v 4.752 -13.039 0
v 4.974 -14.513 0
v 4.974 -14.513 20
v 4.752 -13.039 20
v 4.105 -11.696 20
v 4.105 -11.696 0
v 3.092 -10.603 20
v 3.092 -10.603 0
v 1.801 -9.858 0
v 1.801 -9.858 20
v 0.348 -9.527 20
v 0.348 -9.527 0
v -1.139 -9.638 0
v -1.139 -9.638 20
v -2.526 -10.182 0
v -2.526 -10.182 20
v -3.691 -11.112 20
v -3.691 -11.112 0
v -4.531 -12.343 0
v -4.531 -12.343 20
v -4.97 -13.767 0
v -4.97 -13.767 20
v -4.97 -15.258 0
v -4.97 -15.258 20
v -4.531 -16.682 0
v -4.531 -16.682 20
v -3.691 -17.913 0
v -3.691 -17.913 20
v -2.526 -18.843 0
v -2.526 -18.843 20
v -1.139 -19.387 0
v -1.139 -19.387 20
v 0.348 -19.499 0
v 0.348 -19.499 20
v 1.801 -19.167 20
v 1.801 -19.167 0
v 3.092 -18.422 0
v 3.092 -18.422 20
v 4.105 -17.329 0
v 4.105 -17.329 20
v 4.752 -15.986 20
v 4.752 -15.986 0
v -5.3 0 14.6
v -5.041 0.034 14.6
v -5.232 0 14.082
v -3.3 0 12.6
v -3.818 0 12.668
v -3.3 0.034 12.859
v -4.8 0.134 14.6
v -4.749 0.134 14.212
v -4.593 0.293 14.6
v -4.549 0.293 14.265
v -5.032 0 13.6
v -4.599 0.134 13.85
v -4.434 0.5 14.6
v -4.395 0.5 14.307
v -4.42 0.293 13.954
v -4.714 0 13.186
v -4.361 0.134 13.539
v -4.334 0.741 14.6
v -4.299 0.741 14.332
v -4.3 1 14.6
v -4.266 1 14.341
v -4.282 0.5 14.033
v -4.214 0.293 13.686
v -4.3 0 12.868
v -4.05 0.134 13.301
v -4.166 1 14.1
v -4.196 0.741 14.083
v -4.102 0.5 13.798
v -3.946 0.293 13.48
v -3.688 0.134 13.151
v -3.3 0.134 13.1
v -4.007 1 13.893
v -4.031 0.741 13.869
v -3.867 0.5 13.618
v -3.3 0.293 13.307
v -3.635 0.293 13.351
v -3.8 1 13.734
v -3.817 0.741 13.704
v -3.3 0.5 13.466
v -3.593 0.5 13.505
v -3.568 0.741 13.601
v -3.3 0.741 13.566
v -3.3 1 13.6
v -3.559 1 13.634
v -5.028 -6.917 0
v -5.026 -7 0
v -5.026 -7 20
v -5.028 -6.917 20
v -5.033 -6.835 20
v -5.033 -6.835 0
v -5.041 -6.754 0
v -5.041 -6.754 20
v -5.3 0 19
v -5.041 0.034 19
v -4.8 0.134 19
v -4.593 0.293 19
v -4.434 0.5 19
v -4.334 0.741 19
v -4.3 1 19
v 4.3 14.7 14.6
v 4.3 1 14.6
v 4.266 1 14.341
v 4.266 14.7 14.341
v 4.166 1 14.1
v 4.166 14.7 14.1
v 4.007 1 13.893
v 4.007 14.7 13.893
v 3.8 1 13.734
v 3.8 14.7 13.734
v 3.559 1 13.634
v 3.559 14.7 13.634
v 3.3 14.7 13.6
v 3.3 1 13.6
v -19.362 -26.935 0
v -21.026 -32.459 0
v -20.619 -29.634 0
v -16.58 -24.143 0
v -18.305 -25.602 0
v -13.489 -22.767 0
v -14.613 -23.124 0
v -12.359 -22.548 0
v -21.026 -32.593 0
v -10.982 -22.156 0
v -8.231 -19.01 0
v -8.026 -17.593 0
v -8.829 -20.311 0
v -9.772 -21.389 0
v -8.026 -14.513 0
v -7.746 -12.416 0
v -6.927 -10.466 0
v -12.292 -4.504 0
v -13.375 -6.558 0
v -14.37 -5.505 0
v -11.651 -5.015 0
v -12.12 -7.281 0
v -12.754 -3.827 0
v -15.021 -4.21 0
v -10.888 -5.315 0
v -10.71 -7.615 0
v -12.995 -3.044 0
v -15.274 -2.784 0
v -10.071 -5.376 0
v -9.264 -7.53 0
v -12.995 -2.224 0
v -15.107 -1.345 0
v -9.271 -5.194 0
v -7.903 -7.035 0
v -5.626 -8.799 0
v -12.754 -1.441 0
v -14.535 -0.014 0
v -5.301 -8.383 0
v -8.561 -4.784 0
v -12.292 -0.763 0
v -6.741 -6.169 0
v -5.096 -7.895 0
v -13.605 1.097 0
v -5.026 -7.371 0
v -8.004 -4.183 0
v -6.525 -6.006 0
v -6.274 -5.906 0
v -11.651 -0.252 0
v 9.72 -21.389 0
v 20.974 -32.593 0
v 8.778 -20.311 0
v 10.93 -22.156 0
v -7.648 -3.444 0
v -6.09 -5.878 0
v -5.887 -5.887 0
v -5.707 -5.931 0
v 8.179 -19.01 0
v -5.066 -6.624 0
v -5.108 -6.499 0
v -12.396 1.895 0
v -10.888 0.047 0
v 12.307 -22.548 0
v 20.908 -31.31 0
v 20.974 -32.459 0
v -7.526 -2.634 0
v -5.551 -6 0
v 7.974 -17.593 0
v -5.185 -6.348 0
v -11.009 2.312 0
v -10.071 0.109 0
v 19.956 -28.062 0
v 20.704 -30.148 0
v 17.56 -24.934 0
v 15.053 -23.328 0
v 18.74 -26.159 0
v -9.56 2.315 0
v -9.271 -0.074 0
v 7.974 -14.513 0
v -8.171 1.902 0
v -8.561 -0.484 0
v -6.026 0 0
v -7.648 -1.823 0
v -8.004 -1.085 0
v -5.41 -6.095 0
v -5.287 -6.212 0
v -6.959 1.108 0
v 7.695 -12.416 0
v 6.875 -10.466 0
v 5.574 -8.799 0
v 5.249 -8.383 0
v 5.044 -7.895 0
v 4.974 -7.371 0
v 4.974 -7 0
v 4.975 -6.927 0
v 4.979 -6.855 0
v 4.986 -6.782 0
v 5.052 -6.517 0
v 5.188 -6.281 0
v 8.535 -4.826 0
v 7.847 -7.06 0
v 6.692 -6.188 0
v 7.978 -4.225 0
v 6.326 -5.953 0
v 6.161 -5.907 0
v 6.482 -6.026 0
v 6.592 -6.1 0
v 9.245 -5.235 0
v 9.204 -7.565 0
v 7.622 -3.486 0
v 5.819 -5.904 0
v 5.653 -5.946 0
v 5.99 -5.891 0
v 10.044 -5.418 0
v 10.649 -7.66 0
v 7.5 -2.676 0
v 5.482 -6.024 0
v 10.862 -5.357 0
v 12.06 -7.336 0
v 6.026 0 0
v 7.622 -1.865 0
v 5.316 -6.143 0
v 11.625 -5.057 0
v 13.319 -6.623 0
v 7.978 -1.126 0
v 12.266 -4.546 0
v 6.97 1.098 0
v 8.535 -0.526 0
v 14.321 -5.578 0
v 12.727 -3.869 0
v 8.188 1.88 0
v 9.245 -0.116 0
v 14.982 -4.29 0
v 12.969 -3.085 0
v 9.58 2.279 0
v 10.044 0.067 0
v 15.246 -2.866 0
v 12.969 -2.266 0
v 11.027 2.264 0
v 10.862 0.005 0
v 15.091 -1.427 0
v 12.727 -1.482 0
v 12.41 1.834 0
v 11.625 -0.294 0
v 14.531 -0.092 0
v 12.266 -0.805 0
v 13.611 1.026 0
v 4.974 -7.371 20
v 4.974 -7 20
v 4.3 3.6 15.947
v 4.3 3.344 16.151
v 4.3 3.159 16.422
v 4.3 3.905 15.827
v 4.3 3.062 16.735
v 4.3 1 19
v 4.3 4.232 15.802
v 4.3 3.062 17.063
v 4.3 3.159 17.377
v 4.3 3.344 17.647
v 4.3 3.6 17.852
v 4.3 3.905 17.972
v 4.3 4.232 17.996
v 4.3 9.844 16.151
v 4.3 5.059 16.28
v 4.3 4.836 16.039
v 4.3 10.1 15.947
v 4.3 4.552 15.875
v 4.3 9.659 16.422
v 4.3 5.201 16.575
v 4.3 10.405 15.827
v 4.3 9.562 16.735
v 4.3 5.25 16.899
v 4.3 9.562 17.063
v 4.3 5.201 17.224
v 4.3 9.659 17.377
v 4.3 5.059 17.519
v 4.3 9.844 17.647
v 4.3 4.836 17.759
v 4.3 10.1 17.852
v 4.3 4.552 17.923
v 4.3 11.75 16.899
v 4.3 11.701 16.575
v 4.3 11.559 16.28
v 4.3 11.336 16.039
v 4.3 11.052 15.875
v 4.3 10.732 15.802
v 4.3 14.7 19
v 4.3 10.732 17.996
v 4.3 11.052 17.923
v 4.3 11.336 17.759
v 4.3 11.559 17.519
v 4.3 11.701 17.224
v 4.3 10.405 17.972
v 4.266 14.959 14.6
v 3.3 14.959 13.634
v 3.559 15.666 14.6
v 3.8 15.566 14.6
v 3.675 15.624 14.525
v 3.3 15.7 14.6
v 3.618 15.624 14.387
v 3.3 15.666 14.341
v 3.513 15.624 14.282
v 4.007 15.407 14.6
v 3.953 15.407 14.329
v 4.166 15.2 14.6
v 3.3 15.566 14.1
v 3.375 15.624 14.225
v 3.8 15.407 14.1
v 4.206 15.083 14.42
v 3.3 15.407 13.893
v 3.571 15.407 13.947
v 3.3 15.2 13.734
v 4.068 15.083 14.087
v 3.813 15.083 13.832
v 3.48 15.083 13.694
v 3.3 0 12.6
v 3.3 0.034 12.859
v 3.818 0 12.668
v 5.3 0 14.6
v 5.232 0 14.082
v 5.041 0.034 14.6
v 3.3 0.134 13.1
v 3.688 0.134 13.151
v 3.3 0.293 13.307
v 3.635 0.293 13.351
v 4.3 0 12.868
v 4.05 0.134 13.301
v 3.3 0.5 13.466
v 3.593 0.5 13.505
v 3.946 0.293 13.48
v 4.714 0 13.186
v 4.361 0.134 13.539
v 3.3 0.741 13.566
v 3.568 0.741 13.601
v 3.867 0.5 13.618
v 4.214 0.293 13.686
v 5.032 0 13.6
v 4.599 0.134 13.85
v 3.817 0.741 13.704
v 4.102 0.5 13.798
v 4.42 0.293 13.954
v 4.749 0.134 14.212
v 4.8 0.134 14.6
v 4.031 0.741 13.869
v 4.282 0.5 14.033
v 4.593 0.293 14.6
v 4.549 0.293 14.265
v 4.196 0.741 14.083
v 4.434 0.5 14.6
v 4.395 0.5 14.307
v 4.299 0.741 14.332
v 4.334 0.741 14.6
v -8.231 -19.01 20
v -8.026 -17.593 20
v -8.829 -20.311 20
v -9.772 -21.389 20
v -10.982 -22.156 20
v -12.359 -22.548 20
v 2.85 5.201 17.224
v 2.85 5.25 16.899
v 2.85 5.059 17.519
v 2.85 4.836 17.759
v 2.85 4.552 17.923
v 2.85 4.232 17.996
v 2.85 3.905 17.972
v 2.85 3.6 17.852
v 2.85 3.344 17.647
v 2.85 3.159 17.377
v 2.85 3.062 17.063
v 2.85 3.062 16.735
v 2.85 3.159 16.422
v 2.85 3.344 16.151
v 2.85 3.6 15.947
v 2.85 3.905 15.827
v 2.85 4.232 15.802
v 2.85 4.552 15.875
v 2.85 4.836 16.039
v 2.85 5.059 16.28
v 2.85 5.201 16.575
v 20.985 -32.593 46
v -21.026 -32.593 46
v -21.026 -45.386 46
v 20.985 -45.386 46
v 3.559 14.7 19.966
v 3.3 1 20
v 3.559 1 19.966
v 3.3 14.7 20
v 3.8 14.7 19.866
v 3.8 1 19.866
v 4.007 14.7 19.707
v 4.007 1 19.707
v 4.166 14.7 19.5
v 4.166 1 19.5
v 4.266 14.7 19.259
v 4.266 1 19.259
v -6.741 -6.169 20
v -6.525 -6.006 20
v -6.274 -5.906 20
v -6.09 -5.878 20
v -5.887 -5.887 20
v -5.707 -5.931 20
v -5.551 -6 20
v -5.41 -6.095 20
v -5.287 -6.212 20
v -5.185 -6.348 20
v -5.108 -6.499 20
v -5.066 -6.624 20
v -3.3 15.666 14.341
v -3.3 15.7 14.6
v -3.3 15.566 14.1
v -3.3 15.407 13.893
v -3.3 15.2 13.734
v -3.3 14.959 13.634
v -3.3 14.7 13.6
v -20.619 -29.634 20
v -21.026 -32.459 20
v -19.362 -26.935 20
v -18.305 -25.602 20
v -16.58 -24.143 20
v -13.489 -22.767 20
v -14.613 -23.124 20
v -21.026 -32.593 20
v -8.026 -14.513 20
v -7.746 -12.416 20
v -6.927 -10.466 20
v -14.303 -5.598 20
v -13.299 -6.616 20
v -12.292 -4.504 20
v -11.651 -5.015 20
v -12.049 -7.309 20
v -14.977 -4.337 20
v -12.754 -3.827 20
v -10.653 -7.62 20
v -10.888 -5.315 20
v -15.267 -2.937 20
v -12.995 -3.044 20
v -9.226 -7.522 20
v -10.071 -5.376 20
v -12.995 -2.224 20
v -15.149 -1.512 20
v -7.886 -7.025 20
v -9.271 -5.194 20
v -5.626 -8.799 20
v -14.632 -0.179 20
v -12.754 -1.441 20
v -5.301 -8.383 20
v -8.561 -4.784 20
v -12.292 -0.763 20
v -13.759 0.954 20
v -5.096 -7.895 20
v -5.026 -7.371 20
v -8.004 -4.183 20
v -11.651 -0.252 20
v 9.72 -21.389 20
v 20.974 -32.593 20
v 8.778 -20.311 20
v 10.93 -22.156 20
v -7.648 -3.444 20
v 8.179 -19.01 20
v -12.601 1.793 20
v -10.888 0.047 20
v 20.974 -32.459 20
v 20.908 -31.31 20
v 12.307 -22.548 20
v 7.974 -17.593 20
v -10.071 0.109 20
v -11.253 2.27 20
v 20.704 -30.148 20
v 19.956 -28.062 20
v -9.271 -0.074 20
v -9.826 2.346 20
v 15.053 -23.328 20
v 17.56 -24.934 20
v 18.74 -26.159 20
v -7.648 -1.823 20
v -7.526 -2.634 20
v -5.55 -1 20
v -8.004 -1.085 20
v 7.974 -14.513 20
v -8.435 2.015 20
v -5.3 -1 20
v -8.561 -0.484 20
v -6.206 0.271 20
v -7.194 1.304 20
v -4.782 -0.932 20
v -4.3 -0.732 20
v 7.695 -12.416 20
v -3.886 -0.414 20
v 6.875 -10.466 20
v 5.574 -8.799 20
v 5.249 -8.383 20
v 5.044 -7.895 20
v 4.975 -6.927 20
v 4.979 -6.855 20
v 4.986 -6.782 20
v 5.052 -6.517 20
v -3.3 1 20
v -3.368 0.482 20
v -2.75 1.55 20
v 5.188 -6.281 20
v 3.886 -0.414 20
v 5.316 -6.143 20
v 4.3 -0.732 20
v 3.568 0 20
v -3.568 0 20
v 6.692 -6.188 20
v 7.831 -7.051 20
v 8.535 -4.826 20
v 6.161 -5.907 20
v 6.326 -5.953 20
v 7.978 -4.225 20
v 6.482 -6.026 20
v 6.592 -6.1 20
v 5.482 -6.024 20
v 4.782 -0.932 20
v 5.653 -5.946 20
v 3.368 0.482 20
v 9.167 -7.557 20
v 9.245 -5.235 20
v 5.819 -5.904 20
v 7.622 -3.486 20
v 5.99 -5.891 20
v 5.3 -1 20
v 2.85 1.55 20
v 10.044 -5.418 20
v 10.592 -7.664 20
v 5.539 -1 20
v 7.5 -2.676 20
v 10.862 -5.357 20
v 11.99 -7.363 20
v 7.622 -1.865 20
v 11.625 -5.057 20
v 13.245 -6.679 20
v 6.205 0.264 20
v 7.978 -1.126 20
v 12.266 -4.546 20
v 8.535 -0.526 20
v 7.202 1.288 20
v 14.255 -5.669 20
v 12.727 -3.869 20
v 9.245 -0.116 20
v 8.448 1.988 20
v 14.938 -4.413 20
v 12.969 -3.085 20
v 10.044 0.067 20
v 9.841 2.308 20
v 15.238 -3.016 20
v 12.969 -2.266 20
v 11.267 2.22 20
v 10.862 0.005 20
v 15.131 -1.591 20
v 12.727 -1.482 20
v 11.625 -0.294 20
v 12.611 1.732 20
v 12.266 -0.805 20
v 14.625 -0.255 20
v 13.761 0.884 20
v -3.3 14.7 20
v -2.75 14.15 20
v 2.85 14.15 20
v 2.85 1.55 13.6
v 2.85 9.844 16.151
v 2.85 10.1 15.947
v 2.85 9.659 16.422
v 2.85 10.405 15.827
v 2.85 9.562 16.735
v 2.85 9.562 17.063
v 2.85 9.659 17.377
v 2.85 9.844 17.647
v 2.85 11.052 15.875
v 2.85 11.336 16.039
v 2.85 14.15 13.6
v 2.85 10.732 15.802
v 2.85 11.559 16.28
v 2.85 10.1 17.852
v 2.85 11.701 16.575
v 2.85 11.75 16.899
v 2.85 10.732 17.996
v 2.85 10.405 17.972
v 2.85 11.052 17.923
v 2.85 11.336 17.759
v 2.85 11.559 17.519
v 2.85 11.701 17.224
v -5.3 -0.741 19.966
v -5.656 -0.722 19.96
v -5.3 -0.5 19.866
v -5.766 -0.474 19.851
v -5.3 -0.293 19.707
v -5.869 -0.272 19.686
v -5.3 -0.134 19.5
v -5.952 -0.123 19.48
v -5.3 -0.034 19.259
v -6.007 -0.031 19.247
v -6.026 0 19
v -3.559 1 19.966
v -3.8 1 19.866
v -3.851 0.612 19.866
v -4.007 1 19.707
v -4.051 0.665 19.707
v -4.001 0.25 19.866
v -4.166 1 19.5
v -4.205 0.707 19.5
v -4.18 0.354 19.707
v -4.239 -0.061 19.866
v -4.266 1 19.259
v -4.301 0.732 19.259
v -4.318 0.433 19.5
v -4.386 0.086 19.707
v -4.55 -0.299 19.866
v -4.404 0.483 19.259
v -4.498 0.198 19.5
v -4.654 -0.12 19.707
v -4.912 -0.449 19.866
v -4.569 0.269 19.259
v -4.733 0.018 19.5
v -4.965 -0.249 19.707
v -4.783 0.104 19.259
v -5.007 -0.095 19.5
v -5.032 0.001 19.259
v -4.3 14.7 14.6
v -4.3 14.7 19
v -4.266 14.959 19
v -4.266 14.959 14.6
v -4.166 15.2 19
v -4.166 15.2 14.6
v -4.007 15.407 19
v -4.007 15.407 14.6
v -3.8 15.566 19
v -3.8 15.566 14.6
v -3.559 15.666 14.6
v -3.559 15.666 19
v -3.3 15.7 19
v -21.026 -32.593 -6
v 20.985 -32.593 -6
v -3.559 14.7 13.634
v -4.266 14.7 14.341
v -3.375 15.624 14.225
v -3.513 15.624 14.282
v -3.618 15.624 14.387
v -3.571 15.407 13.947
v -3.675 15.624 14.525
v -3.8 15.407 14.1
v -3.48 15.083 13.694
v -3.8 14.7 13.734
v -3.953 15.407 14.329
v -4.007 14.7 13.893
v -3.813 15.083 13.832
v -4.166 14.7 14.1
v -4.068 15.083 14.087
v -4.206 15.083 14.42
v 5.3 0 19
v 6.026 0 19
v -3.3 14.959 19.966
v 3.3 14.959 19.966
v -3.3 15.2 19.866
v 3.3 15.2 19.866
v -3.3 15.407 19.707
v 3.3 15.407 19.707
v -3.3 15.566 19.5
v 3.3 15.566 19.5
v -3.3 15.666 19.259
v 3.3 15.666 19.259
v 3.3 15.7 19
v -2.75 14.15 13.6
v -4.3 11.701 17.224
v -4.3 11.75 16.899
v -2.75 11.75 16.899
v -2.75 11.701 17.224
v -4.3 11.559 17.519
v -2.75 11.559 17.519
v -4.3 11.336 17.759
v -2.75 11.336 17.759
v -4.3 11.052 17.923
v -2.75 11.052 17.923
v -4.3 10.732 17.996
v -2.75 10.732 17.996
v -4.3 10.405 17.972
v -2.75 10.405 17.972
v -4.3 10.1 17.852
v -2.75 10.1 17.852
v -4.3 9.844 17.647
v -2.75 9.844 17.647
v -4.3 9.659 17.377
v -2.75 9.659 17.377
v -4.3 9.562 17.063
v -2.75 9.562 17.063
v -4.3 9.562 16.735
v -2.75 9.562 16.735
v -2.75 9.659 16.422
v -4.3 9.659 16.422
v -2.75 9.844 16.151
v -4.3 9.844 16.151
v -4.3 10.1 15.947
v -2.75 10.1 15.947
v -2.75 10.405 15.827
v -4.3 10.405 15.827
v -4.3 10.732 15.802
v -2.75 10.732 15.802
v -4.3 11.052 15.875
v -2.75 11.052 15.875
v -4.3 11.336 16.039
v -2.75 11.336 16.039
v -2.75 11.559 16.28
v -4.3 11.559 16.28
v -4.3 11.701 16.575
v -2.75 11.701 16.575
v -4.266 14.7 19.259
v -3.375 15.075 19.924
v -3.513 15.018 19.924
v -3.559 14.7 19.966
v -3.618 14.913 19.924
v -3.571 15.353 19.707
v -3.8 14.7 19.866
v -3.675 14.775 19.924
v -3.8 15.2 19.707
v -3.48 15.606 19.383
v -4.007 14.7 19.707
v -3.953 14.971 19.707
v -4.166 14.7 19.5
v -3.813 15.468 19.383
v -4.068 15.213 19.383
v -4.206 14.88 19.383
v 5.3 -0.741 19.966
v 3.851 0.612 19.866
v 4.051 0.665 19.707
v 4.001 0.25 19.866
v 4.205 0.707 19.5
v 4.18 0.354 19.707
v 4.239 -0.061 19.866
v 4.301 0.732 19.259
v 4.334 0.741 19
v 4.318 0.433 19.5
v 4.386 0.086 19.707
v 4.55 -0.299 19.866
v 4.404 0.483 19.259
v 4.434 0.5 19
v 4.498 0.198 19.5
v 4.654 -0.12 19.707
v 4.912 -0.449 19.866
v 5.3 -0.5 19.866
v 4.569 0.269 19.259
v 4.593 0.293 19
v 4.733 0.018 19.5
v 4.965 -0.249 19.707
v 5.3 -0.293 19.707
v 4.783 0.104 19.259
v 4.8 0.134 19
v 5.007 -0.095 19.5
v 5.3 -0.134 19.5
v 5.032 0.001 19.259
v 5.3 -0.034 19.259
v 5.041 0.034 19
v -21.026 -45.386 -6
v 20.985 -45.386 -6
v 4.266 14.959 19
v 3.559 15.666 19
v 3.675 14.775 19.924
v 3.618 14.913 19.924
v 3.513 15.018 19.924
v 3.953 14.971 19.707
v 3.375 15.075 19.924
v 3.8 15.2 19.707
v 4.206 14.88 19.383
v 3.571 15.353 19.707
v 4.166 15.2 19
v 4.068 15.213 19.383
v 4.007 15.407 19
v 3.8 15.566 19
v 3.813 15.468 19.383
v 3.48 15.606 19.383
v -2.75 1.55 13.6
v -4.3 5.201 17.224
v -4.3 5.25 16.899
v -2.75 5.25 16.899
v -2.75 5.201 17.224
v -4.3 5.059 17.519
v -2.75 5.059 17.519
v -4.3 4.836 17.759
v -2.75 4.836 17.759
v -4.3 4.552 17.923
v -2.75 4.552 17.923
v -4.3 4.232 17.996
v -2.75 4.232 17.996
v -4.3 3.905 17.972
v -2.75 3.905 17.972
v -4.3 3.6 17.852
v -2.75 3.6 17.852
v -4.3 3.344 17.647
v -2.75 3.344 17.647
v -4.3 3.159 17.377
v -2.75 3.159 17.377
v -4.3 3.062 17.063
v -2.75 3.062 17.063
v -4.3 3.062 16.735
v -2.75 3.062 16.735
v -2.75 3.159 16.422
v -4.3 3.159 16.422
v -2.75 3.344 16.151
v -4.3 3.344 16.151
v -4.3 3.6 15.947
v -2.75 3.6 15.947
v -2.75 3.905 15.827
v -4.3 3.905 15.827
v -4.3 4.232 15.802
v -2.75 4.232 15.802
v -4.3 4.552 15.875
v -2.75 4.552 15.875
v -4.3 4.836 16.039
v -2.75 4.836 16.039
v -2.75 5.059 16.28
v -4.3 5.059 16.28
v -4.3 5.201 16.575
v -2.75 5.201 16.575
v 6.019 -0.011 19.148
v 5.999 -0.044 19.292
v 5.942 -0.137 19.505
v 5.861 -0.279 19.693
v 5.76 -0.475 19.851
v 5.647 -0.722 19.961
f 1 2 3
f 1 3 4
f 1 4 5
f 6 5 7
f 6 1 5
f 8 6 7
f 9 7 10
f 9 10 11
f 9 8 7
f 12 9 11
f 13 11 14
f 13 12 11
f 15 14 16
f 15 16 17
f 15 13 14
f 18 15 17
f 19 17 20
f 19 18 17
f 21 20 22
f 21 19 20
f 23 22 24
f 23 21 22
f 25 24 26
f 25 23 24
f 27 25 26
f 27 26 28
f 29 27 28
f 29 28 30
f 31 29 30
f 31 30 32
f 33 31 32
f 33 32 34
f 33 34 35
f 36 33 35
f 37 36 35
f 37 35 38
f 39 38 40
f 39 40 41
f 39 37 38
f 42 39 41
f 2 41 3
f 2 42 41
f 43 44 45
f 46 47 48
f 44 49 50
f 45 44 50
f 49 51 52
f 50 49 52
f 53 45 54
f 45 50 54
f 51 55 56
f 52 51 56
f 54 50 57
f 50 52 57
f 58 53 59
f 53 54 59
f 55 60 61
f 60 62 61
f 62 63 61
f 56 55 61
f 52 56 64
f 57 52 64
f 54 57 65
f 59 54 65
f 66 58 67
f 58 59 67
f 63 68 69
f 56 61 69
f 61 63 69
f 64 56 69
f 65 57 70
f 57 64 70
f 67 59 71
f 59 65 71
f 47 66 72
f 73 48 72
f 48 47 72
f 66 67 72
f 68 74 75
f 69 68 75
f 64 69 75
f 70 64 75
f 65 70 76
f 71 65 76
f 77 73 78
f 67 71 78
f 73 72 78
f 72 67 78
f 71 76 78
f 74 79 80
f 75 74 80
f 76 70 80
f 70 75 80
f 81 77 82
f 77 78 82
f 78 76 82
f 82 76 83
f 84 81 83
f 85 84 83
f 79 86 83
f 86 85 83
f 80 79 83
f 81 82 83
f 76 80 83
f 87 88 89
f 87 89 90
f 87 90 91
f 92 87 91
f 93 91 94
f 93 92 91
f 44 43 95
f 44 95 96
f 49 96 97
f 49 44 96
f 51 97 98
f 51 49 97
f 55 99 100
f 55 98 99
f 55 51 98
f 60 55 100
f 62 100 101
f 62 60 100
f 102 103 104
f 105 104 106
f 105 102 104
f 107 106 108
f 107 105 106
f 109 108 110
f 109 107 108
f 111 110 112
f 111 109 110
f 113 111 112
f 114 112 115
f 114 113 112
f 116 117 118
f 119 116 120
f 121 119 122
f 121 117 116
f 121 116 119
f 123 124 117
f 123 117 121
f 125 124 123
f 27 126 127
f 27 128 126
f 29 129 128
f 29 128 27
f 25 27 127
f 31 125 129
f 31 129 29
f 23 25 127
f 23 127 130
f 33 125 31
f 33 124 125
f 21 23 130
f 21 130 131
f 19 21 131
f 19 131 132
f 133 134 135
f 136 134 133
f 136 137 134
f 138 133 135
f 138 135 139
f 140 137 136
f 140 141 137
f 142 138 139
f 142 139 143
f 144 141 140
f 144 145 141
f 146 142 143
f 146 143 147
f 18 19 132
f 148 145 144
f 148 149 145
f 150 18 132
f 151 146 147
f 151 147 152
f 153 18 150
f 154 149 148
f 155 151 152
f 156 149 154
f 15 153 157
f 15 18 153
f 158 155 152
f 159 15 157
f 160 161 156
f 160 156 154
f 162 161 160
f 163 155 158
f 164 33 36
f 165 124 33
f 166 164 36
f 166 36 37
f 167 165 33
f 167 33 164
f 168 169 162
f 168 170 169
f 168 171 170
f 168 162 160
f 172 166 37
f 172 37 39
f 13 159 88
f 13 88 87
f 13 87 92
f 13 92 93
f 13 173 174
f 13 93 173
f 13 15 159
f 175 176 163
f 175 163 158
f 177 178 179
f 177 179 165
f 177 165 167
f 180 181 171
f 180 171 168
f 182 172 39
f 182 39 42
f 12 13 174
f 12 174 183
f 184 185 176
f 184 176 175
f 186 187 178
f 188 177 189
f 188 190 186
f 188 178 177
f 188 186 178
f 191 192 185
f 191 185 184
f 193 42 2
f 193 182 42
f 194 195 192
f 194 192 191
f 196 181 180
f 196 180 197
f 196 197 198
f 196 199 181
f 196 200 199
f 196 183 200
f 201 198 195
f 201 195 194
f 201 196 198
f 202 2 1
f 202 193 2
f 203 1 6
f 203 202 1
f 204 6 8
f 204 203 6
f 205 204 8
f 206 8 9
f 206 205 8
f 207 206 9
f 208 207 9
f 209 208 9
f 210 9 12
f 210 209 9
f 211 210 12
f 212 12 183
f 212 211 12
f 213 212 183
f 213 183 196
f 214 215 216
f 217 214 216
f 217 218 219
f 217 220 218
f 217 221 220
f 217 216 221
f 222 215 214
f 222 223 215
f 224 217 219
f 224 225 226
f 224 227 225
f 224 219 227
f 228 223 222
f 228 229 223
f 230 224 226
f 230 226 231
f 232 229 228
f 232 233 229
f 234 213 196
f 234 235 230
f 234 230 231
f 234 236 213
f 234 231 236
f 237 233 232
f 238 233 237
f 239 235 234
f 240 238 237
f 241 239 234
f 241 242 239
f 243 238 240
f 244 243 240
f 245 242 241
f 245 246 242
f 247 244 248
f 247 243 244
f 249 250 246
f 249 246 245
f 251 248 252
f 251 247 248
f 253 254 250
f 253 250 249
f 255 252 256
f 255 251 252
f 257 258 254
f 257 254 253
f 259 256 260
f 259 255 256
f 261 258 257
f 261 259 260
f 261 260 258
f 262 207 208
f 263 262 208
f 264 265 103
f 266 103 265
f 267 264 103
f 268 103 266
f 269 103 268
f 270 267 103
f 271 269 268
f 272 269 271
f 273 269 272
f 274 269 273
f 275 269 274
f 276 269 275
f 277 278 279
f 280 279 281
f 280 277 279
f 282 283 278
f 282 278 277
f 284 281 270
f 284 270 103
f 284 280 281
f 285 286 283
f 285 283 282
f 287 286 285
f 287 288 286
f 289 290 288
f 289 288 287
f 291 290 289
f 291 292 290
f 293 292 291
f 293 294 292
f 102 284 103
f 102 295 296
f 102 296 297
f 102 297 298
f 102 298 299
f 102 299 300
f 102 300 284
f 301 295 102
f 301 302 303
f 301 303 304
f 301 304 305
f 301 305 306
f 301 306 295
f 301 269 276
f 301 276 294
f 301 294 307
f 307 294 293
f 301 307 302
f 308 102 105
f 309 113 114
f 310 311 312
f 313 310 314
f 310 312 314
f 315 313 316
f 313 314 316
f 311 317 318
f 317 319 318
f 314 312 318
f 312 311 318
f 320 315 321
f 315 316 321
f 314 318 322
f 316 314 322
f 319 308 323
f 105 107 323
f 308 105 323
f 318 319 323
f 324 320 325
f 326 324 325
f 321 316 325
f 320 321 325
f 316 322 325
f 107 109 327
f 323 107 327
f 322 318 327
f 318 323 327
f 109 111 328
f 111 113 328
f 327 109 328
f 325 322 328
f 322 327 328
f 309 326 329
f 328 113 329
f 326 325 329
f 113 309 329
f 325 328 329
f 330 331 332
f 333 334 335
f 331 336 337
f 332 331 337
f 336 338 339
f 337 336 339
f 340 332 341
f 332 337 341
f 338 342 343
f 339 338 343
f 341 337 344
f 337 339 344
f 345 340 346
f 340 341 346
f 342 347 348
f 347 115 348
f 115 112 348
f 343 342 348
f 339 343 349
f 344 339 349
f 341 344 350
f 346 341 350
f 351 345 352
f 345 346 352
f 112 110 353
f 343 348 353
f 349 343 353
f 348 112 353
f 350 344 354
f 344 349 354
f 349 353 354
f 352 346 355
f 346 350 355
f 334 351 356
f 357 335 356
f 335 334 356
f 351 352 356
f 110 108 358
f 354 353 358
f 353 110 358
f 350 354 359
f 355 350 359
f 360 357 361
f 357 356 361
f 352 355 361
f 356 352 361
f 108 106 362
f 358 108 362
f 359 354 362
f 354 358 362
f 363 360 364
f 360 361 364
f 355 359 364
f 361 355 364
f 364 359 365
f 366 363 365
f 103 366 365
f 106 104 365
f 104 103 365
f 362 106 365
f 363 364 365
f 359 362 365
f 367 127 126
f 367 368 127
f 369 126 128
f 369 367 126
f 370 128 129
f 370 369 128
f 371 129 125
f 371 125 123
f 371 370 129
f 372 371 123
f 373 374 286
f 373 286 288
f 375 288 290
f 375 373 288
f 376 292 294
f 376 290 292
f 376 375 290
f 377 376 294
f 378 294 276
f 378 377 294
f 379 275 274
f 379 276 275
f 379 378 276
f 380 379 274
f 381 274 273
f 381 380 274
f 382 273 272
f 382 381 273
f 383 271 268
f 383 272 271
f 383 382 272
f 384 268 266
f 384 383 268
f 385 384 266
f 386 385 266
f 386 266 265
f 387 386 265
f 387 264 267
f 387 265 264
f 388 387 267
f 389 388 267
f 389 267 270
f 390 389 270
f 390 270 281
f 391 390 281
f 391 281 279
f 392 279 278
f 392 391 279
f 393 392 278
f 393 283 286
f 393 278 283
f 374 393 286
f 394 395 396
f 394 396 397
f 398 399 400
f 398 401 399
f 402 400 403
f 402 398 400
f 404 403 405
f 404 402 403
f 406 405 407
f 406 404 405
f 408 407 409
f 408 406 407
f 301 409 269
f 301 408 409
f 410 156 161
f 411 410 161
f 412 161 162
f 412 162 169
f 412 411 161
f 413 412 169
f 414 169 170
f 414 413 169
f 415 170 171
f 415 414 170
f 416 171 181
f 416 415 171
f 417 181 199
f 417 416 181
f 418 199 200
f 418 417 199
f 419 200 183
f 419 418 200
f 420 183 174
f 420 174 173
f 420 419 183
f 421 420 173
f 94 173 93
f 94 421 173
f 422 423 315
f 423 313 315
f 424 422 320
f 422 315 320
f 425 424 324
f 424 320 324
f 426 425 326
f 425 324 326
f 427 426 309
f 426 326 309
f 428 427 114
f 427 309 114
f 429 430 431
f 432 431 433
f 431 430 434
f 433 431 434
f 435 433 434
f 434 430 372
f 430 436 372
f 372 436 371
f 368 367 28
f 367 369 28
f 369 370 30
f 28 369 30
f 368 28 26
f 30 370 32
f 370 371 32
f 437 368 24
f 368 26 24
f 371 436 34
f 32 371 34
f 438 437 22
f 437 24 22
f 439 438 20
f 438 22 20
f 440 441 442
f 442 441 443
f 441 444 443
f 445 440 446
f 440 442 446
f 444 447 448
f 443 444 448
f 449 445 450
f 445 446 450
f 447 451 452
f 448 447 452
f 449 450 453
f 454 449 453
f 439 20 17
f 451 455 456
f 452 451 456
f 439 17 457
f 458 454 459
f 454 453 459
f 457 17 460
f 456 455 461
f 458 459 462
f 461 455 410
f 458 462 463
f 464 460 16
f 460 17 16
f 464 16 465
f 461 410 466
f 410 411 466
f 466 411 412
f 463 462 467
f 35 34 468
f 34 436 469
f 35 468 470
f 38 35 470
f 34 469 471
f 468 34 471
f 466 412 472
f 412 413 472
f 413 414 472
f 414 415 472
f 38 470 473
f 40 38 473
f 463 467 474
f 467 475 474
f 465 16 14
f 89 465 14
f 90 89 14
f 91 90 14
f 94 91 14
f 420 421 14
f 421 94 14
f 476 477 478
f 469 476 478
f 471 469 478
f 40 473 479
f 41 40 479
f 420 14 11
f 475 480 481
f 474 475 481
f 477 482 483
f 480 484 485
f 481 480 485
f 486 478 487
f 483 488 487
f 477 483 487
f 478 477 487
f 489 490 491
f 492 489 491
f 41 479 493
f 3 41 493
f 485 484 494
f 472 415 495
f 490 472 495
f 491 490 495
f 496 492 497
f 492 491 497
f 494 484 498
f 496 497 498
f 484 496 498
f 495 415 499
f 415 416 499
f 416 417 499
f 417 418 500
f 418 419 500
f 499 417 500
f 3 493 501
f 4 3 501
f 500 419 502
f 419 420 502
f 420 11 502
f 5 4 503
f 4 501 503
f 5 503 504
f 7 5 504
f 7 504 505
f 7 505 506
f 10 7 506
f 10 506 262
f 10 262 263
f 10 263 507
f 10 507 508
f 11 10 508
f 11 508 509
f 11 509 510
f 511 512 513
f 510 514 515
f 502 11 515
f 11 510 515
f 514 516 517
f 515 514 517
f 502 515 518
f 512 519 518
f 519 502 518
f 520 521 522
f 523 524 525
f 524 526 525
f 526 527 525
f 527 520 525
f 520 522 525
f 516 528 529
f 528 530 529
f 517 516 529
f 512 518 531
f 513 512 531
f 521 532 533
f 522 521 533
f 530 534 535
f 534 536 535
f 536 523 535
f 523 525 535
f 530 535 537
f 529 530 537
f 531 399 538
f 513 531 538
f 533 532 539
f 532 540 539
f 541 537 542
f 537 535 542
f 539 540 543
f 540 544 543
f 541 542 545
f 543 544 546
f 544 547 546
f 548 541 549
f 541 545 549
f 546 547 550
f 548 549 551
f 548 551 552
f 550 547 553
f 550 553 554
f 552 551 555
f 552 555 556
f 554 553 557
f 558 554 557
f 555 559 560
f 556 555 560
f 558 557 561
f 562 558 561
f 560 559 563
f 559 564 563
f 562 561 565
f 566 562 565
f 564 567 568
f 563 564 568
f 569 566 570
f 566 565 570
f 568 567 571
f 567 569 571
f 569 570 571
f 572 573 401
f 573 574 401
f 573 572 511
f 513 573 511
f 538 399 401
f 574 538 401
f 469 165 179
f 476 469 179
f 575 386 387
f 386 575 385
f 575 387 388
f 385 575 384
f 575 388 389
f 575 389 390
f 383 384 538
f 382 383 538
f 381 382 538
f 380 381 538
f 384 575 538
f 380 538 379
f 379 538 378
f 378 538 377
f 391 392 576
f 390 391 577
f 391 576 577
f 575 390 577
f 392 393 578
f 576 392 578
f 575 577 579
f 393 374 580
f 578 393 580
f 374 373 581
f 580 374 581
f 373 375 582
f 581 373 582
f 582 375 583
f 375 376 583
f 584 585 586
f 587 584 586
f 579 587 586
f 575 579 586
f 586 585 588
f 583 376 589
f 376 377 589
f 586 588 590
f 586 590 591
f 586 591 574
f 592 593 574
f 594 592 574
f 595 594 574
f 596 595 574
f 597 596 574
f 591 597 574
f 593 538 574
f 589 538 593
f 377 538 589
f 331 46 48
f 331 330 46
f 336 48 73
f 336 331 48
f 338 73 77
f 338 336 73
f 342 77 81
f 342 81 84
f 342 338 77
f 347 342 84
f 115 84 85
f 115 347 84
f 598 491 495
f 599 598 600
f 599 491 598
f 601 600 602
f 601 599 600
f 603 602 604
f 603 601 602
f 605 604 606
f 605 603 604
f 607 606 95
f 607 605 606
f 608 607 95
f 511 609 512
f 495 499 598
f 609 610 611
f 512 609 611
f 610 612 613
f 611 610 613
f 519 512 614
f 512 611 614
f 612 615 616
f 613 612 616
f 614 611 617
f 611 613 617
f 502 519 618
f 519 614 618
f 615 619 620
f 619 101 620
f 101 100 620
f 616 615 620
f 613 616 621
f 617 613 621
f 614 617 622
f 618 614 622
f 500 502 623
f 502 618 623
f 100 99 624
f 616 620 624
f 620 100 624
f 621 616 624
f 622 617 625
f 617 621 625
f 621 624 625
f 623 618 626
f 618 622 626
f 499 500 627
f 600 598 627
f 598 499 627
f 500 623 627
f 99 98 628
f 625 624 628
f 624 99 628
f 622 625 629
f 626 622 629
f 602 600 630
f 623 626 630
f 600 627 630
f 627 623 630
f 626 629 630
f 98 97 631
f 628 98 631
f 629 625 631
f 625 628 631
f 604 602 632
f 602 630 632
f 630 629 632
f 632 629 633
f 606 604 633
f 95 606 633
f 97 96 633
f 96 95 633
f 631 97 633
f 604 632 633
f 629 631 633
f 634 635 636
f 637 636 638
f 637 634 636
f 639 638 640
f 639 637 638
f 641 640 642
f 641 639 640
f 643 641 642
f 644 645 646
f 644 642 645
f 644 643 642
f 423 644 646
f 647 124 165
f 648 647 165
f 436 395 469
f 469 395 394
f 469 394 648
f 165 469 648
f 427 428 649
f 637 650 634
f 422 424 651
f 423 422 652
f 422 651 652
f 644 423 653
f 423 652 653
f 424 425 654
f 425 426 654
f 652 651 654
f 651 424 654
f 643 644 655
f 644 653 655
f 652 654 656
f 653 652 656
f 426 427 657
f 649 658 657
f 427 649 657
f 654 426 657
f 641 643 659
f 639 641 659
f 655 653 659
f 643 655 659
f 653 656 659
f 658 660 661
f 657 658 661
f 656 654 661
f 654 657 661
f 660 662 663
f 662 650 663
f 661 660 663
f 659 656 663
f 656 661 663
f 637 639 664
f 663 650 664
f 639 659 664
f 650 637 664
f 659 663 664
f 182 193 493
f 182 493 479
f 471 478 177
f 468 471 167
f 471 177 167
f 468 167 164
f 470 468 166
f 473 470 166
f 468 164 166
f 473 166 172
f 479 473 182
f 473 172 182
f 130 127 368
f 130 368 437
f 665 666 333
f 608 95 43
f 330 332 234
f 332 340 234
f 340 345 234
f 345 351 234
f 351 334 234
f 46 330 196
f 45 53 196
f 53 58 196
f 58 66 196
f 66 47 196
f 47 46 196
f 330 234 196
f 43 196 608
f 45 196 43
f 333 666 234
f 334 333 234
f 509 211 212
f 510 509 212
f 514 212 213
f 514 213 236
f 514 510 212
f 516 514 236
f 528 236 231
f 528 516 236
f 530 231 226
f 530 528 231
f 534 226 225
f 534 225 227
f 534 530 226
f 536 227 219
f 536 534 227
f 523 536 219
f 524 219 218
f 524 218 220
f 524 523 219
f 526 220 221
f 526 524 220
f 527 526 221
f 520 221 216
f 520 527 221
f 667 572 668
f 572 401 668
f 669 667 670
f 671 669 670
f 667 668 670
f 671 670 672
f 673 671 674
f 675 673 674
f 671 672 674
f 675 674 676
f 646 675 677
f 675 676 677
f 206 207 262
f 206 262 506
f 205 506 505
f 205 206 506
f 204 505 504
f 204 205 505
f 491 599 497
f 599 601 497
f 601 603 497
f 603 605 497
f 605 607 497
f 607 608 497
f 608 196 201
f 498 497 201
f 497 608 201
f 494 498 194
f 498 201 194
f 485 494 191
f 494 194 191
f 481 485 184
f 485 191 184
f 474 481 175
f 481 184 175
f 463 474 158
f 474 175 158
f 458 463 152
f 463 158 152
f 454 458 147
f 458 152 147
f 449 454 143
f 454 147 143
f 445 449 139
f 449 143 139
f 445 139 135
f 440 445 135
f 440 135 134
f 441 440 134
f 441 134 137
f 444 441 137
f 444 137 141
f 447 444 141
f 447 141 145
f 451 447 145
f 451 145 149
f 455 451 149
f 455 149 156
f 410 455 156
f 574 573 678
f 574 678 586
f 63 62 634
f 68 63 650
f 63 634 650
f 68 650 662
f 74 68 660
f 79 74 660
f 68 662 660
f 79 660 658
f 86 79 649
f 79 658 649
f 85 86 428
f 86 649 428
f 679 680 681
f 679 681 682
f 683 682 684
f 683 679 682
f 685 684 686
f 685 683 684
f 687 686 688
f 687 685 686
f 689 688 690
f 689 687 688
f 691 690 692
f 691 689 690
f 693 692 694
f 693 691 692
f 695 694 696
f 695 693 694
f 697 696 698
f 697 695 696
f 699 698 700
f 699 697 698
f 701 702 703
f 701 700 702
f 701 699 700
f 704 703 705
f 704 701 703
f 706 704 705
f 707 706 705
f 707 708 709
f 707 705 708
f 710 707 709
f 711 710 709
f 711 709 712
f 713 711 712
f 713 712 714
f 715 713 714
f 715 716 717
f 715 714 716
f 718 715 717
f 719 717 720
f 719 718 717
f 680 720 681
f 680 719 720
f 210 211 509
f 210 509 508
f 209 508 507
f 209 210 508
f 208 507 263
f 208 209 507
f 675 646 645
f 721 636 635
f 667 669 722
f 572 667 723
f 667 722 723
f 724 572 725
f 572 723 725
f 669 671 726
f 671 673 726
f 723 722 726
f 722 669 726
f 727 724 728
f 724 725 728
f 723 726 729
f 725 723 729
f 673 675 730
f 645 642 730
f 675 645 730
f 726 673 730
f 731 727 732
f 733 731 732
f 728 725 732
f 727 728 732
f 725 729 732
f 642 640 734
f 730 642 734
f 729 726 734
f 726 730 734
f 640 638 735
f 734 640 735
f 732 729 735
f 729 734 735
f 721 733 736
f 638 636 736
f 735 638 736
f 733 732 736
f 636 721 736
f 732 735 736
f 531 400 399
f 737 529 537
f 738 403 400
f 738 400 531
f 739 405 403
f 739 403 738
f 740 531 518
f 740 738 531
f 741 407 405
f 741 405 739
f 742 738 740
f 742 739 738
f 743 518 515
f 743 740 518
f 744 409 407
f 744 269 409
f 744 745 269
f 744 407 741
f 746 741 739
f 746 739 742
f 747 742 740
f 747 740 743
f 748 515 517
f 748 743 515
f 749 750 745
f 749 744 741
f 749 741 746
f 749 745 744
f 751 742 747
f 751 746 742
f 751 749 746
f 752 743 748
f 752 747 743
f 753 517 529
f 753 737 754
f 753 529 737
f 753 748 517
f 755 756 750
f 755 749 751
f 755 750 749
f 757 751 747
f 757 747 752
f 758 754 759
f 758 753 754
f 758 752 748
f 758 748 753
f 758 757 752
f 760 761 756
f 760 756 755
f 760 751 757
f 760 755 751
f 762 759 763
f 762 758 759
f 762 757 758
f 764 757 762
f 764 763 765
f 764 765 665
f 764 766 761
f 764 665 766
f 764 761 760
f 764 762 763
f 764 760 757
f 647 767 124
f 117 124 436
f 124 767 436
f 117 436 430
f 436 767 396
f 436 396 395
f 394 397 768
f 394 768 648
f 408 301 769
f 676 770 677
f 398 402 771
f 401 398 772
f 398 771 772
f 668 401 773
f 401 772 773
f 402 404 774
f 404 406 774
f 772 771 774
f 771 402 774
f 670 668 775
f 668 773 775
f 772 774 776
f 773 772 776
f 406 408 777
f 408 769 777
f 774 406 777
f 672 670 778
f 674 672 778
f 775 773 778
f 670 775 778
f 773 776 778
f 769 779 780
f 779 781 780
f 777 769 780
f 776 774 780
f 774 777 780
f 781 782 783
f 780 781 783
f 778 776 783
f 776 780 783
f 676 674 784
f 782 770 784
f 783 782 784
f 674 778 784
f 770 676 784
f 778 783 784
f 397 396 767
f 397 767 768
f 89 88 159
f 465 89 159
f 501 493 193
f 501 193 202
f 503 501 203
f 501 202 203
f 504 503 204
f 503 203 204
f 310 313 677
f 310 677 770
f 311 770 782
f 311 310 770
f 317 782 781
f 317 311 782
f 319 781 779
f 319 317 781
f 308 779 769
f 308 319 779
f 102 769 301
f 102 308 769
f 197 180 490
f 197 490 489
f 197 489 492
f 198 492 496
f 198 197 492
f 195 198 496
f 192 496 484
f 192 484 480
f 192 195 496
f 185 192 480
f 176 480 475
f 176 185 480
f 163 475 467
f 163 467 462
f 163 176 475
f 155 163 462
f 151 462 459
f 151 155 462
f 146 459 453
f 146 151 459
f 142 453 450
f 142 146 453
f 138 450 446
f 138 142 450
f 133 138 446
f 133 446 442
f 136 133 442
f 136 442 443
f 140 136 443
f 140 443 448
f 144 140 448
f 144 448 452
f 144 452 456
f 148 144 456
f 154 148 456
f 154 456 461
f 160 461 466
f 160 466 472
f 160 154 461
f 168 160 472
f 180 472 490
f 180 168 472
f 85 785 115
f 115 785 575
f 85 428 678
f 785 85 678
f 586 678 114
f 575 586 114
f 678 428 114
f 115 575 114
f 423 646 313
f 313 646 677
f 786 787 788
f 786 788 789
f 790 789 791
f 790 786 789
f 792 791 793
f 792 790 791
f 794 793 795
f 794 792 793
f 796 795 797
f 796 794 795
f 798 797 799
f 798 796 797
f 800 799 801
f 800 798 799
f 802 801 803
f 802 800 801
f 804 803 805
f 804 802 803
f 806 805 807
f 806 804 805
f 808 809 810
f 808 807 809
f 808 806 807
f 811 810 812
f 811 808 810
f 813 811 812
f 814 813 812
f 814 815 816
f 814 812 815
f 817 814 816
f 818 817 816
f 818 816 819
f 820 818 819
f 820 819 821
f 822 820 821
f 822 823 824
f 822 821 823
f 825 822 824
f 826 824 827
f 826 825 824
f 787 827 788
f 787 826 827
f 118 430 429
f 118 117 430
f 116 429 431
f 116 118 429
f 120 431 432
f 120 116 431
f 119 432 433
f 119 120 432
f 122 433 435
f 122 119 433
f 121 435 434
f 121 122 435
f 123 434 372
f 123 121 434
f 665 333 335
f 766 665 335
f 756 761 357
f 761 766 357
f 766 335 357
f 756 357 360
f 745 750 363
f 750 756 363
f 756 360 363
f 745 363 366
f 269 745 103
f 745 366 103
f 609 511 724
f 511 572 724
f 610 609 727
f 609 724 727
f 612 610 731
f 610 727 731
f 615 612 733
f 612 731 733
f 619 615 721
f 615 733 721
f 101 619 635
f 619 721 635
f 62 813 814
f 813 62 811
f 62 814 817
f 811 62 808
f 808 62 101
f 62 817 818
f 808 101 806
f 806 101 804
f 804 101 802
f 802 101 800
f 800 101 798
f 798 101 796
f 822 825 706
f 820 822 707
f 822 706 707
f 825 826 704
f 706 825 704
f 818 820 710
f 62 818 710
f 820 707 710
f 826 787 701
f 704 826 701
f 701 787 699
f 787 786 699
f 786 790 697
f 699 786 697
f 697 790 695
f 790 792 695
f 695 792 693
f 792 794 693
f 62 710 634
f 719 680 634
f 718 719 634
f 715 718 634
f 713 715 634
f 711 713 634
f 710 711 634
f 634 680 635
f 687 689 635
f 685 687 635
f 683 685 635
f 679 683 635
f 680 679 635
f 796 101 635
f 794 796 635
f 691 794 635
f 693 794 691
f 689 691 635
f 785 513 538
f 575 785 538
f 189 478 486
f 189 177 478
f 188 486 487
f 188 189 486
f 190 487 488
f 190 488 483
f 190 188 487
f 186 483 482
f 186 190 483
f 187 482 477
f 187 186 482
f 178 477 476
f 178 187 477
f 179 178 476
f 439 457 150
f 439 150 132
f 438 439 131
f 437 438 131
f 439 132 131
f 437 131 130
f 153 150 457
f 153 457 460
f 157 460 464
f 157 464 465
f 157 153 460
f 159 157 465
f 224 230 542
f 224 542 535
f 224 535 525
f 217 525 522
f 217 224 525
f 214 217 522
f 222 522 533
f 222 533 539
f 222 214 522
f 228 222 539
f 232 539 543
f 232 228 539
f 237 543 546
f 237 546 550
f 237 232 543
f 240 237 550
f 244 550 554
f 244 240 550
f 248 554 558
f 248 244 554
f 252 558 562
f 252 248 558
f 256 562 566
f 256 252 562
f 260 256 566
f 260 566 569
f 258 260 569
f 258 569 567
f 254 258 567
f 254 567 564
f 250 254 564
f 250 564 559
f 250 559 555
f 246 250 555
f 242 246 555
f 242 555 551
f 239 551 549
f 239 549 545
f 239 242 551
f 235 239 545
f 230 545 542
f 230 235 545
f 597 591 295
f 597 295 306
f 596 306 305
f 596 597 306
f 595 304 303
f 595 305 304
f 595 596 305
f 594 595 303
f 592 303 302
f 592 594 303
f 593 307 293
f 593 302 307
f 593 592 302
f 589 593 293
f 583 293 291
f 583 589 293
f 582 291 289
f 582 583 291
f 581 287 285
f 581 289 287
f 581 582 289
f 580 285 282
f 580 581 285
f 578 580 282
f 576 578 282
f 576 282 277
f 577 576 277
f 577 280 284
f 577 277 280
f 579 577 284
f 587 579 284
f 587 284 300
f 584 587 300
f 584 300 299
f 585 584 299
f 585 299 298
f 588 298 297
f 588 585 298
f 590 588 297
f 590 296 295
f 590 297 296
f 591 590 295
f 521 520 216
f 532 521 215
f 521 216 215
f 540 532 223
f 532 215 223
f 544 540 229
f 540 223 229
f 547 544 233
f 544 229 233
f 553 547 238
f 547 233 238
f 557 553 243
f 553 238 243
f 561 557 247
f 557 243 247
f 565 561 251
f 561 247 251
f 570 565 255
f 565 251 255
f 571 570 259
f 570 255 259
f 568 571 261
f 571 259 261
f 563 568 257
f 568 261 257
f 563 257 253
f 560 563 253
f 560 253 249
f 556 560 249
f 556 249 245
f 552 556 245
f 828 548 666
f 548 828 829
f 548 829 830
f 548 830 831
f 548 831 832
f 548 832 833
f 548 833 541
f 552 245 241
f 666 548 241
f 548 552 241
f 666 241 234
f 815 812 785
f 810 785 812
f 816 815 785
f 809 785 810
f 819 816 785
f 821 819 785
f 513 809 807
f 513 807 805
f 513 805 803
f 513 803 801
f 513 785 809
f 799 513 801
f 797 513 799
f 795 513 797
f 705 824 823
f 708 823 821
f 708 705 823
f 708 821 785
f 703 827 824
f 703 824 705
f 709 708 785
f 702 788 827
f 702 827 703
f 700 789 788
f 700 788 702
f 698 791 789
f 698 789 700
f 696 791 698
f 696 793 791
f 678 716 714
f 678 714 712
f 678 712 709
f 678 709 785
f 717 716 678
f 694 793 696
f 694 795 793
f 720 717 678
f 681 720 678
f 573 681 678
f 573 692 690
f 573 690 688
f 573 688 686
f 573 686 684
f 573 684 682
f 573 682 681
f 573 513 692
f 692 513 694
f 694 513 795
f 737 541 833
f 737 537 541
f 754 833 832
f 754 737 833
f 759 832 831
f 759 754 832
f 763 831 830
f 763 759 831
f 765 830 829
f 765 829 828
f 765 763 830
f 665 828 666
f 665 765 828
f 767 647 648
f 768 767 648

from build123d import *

# Parameters (mm, degrees)
CROQUIS1_R                 = 5
CROQUIS1_R_2               = 2.75
SALIENTE_EXTRUIR1_DEPTH    = 20
SALIENTE_EXTRUIR4_DEPTH    = 10
CROQUIS7_W                 = 42
CROQUIS7_H                 = 10
EXTRUIR_L_MINA1_DEPTH      = 20
CROQUIS8_W                 = 42.01139879
CROQUIS8_H                 = 12.793457143
SALIENTE_EXTRUIR6_DEPTH    = 26
REDONDEO1_R                = 2
REDONDEO2_R                = 1
CROQUIS9_W                 = 8.6
CROQUIS9_H                 = 15.7
CROQUIS9_W_2               = 5.6
CROQUIS9_H_2               = 12.6
SALIENTE_EXTRUIR7_DEPTH    = 6.4
CORTAR_EXTRUIR1_DEPTH      = 70.406702341
CORTAR_EXTRUIR1_DEPTH_BACK = 70.406702341
CROQUIS11_R                = 1.1
REDONDEO3_R                = 1
REDONDEO4_R                = 5
REDONDEO5_R                = 10


# Some blends are built 0.0001 mm under size
with BuildPart() as part:
    # Croquis1 → Saliente-Extruir1 (new body)
    with BuildSketch(Plane.XY):
        with BuildLine():
            Line((-5.025921035, -5.26753442), (-5.025921035, -8.26753442))
            ThreePointArc((-5.025921035, -8.26753442), (-0.025921035, -22.512532419), (4.974078965, -8.26753442))
            Line((4.974078965, -8.26753442), (4.974078965, -5.26753442))
            Line((4.974078965, -5.26753442), (5.974078965, -5.26753442))
            ThreePointArc((5.974078965, -5.26753442), (15.249563623, -2.724799651), (6.025921035, 0))
            Line((6.025921035, 0), (5.025921035, 0))
            Line((5.025921035, 0), (-5.025921035, 0))
            Line((-5.025921035, 0), (-6.025921035, 0))
            ThreePointArc((-6.025921035, 0), (-15.276011655, -2.63376721), (-6.025921035, -5.26753442))
            Line((-6.025921035, -5.26753442), (-5.025921035, -5.26753442))
        make_face()
        with Locations((-0.025921035, -14.512532419)):
            Circle(CROQUIS1_R, mode=Mode.SUBTRACT)
        with Locations((-10.276011655, -2.63376721)):
            Circle(CROQUIS1_R_2, mode=Mode.SUBTRACT)
        with Locations(Location((10.249805759, -2.675592988, 0), (0, 0, 180))):
            Circle(CROQUIS1_R_2, mode=Mode.SUBTRACT)
    extrude(amount=SALIENTE_EXTRUIR1_DEPTH)

    # Croquis5 → Saliente-Extruir4 (add, symmetric)
    with BuildSketch(Plane(origin=(0, 0, 10), x_dir=(-1, 0, 0), z_dir=(0, 0, -1))):
        with BuildLine():
            Line((-7.974078965, -14.512532419), (-7.974078965, -32.592532419))
            Line((-7.974078965, -32.592532419), (8.025921035, -32.592532419))
            Line((8.025921035, -32.592532419), (8.025921035, -14.512532419))
            ThreePointArc((8.025921035, -14.512532419), (0.025921035, -22.512532419), (-7.974078965, -14.512532419))
        make_face()
    extrude(amount=SALIENTE_EXTRUIR4_DEPTH, both=True)

    # Croquis7 → Extruir-Lámina1 (add)
    with BuildSketch(Plane.XY.offset(20)):
        with Locations((-0.025921035, -27.592532419)):
            Rectangle(CROQUIS7_W, CROQUIS7_H)
    extrude(amount=-EXTRUIR_L_MINA1_DEPTH)

    # Croquis8 → Saliente-Extruir6 (add, symmetric)
    with BuildSketch(Plane.XY.offset(20)):
        with Locations((-0.02022164, -38.989260991)):
            Rectangle(CROQUIS8_W, CROQUIS8_H)
    extrude(amount=SALIENTE_EXTRUIR6_DEPTH, both=True)

    # Redondeo1
    # the kernel refuses this fillet: 2 mm, written as the material it adds along each edge
    with BuildSketch(Plane(origin=(-5.025921035, -8.26753442, 0), x_dir=(0, 1, 0), z_dir=(0, 0, 1))) as redondeo1_piece_1:
        with BuildLine():
            CenterArc((0.89643043, 2), REDONDEO1_R, 224.427004001, 45.572995999)
            Line((-0.531855256, 0.6), (-0.560420969, 0.572))
            ThreePointArc((-0.560420969, 0.572), (-0.288339065, 0.280133933), (-0.03122499, -0.025))
            Line((-0.03122499, -0.025), (0, -0.04))
            Line((0, -0.04), (0.89643043, -0.04))
            Line((0.89643043, -0.04), (0.89643043, 0))
        make_face()
    extrude(amount=20)
    with BuildSketch(Plane(origin=(4.974078965, -8.26753442, 0), x_dir=(0.7483239866610061, -0.6633334086172491, 0), z_dir=(0, 0, 1))) as redondeo1_piece_2:
        with BuildLine():
            CenterArc((0.902015721, 1.99748721), REDONDEO1_R, 221.554595727, 45.572995999)
            Line((-0.594632253, 0.670820393), (-0.624565212, 0.644287057))
            Line((-0.624565212, 0.644287057), (-0.029932959, -0.026533336))
            Line((-0.029932959, -0.026533336), (0.002004479, -0.039949744))
            ThreePointArc((0.002004479, -0.039949744), (0.400895876, -0.029948842), (0.799787272, -0.039949744))
            Line((0.799787272, -0.039949744), (0.801791752, 0))
        make_face()
    extrude(amount=20)
    with BuildSketch(Plane(origin=(-5.025921035, -5.26753442, 0), x_dir=(-1, 0, 0), z_dir=(0, 0, 1))) as redondeo1_piece_3:
        with BuildLine():
            CenterArc((2, 1.732050808), REDONDEO1_R, 180, 60)
            Line((0, 1.732050808), (-0.04, 1.732050808))
            Line((-0.04, 1.732050808), (-0.04, 0))
            Line((-0.04, 0), (0, -0.04))
            ThreePointArc((0, -0.04), (0.5, -0.04), (0.98, -0.034641016))
            Line((0.98, -0.034641016), (1, 0))
        make_face()
    extrude(amount=20)
    with BuildSketch(Plane(origin=(4.974078965, -5.26753442, 0), x_dir=(0, -1, 0), z_dir=(0, 0, 1))) as redondeo1_piece_4:
        with BuildLine():
            CenterArc((1.732050808, 2), REDONDEO1_R, 210, 60)
            Line((0, 1), (-0.034641016, 0.98))
            ThreePointArc((-0.034641016, 0.98), (-0.04, 0.5), (-0.04, 0))
            Line((-0.04, 0), (0, -0.04))
            Line((0, -0.04), (1.732050808, -0.04))
            Line((1.732050808, -0.04), (1.732050808, 0))
        make_face()
    extrude(amount=20)

    # Redondeo2
    redondeo2_edges = [part.edges().sort_by_distance(p)[0] for p in [
        (-6.025921035, -5.26753442, 10),
        (5.974078965, -5.26753442, 10),
    ]]
    fillet(redondeo2_edges, radius=REDONDEO2_R)

    # Croquis9 → Saliente-Extruir7 (add)
    with BuildSketch(Plane.XY.offset(20)):
        with Locations((0, 7.85)):
            Rectangle(CROQUIS9_W, CROQUIS9_H)
        with Locations((0.05, 7.85)):
            Rectangle(CROQUIS9_W_2, CROQUIS9_H_2, mode=Mode.SUBTRACT)
    extrude(amount=-SALIENTE_EXTRUIR7_DEPTH)

    # Croquis11 → Cortar-Extruir1 (cut, two sides: drawn at the far end of the back side and taken through both)
    with BuildSketch(Plane(origin=(4.3, 0, 0), x_dir=(0, 0, -1), z_dir=(1, 0, 0)).offset(-CORTAR_EXTRUIR1_DEPTH_BACK)):
        with Locations(Location((-16.899272709, 10.65, 0), (0, 0, 90))):
            Circle(CROQUIS11_R)
        with Locations(Location((-16.899272709, 4.15, 0), (0, 0, 90))):
            Circle(CROQUIS11_R)
    extrude(amount=CORTAR_EXTRUIR1_DEPTH + CORTAR_EXTRUIR1_DEPTH_BACK, mode=Mode.SUBTRACT)

    # Redondeo3
    redondeo3_edges = [part.edges().sort_by_distance(p)[0] for p in [
        (-5.162960517, 0, 20),
        (4.3, 7.85, 13.6),
        (4.3, 15.7, 16.8),
        (0, 0, 13.6),
        (4.3, 0, 16.8),
        (-4.3, 7.85, 13.6),
        (-4.3, 0, 16.8),
        (0, 15.7, 13.6),
        (-4.3, 15.7, 16.8),
        (4.3, 7.85, 20),
        (0, 15.7, 20),
        (-4.3, 7.85, 20),
        (5.162960517, 0, 20),
    ]]
    fillet(redondeo3_edges, radius=REDONDEO3_R)

    # Redondeo4
    redondeo4_edges = [part.edges().sort_by_distance(p)[0] for p in [
        (-8.025921035, -22.592532419, 10),
        (7.974078965, -22.592532419, 10),
    ]]
    fillet(redondeo4_edges, radius=REDONDEO4_R)

    # Redondeo5
    redondeo5_edges = [part.edges().sort_by_distance(p)[0] for p in [
        (-21.025921035, -22.592532419, 10),
        (20.974078965, -22.592532419, 10),
    ]]
    fillet(redondeo5_edges, radius=REDONDEO5_R - 0.0001)  # a hair under: the kernel refuses the full size


solid = part.part
